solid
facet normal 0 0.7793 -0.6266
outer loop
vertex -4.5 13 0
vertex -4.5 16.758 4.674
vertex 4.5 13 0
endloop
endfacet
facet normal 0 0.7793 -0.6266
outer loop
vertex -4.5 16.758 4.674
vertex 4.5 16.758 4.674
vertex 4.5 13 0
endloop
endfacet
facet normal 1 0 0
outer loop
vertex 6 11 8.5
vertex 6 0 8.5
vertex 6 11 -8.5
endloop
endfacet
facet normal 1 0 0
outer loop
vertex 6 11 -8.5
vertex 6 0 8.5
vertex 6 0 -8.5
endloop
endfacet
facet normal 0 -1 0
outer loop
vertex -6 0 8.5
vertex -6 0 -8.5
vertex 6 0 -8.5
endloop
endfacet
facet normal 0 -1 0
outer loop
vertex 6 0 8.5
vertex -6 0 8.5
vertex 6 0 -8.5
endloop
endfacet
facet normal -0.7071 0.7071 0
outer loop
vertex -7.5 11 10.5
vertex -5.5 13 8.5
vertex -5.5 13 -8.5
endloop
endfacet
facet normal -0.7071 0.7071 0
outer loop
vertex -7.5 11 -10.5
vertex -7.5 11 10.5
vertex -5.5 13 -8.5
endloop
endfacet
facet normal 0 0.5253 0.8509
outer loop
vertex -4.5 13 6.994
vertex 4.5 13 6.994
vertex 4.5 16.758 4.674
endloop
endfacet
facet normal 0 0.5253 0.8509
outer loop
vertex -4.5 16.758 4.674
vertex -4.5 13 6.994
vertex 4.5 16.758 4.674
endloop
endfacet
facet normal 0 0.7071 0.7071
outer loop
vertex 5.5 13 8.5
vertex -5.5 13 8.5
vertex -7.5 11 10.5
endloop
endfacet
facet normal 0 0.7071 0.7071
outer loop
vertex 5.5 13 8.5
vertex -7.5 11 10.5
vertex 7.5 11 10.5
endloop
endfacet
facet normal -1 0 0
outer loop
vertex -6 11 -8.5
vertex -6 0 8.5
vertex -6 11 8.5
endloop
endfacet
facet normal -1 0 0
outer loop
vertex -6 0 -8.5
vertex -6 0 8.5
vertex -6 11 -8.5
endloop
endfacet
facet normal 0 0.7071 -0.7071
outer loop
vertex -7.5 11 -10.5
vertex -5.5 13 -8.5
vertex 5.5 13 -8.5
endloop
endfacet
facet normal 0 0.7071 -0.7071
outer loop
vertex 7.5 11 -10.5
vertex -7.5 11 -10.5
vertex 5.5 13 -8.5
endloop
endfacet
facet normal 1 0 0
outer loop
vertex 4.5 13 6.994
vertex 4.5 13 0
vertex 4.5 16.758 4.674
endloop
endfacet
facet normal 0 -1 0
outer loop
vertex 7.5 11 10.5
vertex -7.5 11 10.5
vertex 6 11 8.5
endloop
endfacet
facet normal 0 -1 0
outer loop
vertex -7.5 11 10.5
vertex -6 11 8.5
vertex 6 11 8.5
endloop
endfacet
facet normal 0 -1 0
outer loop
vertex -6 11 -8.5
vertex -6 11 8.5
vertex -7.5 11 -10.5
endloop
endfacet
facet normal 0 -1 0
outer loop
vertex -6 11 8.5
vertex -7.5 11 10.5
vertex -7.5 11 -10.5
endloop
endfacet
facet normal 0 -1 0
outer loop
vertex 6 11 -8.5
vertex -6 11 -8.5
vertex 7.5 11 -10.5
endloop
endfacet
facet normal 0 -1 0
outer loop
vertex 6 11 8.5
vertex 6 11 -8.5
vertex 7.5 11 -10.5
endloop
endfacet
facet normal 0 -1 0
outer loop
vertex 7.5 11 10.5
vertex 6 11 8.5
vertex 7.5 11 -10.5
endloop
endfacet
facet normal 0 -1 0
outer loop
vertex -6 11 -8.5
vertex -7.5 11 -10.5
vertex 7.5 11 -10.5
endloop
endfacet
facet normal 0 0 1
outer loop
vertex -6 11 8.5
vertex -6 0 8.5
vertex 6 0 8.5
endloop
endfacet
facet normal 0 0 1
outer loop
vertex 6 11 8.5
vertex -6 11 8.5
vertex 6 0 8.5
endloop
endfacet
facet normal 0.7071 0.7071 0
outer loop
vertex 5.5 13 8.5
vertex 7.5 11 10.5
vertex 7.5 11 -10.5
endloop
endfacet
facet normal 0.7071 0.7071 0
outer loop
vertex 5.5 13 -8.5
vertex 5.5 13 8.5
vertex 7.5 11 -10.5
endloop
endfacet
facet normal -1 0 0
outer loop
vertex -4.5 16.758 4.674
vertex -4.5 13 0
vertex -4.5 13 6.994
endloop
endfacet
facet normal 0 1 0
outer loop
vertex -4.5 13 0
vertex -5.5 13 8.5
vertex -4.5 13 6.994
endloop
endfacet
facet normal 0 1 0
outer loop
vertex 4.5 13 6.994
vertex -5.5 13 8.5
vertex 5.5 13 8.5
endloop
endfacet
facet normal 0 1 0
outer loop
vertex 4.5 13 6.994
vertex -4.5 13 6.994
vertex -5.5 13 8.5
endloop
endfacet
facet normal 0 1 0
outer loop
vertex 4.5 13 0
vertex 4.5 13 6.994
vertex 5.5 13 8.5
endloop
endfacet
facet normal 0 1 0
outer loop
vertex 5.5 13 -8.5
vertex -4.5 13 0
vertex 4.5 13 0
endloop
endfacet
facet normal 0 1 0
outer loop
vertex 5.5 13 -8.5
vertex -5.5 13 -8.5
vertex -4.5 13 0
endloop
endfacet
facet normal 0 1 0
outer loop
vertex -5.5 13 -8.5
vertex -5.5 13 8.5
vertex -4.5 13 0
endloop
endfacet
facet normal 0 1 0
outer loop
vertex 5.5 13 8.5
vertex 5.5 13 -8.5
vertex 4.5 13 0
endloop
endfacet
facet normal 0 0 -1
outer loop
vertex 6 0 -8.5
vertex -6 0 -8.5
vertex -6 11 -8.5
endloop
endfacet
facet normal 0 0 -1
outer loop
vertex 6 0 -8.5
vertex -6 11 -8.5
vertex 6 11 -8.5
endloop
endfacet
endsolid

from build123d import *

# Parameters (mm, degrees)
SKETCH_1_W      = 12
SKETCH_1_H      = 17
EXTRUDE_1_DEPTH = 11
SKETCH_2_W      = 15
SKETCH_2_H      = 21
EXTRUDE_2_DEPTH = 2
CHAMFER_1_SIZE  = 2
EXTRUDE_3_DEPTH = 4.5


with BuildPart() as part:
    # 草图1 → 凸台-拉伸1 (new body)
    with BuildSketch(Plane(origin=(0, 0, 0), x_dir=(1, 0, 0), z_dir=(0, 1, 0))):
        Rectangle(SKETCH_1_W, SKETCH_1_H)
    extrude(amount=EXTRUDE_1_DEPTH)

    # 草图2 → 凸台-拉伸2 (add)
    with BuildSketch(Plane(origin=(0, 11, 0), x_dir=(1, 0, 0), z_dir=(0, 1, 0))):
        Rectangle(SKETCH_2_W, SKETCH_2_H)
    extrude(amount=EXTRUDE_2_DEPTH)

    # 倒角1
    chamfer_1_edges = [part.edges().sort_by_distance(p)[0] for p in [
        (0, 13, -10.5),
        (7.5, 13, 0),
        (0, 13, 10.5),
        (-7.5, 13, 0),
    ]]
    chamfer(chamfer_1_edges, length=CHAMFER_1_SIZE - 0.0001)  # a hair under: the kernel refuses the full size

    # 草图3 → 凸台-拉伸3 (add, symmetric)
    with BuildSketch(Plane(origin=(0, 0, 0), x_dir=(0, 0, -1), z_dir=(1, 0, 0))):
        Polygon((-6.993584735, 13), (-4.673908178, 16.758295881), (0, 13), align=None)
    extrude(amount=EXTRUDE_3_DEPTH, both=True)


solid = part.part
